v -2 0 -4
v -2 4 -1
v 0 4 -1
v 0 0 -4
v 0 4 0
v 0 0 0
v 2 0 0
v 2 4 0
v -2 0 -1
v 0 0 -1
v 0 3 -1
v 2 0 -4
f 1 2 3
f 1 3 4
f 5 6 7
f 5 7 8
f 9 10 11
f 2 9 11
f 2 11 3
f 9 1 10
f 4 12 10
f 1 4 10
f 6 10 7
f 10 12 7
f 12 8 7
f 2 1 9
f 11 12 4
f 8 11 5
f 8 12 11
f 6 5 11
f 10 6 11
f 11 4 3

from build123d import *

# Parameters (mm, degrees)
SKETCH1_W           = 4
SKETCH1_H           = 4
BOSS_EXTRUDE1_DEPTH = 2
SKETCH2_W           = 3
SKETCH2_H           = 4
BOSS_EXTRUDE2_DEPTH = 2
CUT_EXTRUDE1_DEPTH  = 2
CUT_EXTRUDE2_DEPTH  = 2


with BuildPart() as part:
    # Sketch1 → Boss-Extrude1 (new body)
    with BuildSketch(Plane(origin=(0, 0, 0), x_dir=(0, 0, -1), z_dir=(1, 0, 0))):
        with Locations((2, 2)):
            Rectangle(SKETCH1_W, SKETCH1_H)
    extrude(amount=BOSS_EXTRUDE1_DEPTH)

    # Sketch2 → Boss-Extrude2 (add)
    with BuildSketch(Plane.ZY):
        with Locations((-2.5, 2)):
            Rectangle(SKETCH2_W, SKETCH2_H)
    extrude(amount=BOSS_EXTRUDE2_DEPTH)

    # Sketch3 → Cut-Extrude1 (cut)
    with BuildSketch(Plane.ZY.offset(2)):
        Polygon((-1, 4), (-4, 0), (-4, 4), align=None)
    extrude(amount=-CUT_EXTRUDE1_DEPTH, mode=Mode.SUBTRACT)

    # Sketch4 → Cut-Extrude2 (cut)
    with BuildSketch(Plane(origin=(2, 0, 0), x_dir=(0, 0, -1), z_dir=(1, 0, 0))):
        Polygon((4, 0), (0, 4), (4, 4), align=None)
    extrude(amount=-CUT_EXTRUDE2_DEPTH, mode=Mode.SUBTRACT)


solid = part.part
